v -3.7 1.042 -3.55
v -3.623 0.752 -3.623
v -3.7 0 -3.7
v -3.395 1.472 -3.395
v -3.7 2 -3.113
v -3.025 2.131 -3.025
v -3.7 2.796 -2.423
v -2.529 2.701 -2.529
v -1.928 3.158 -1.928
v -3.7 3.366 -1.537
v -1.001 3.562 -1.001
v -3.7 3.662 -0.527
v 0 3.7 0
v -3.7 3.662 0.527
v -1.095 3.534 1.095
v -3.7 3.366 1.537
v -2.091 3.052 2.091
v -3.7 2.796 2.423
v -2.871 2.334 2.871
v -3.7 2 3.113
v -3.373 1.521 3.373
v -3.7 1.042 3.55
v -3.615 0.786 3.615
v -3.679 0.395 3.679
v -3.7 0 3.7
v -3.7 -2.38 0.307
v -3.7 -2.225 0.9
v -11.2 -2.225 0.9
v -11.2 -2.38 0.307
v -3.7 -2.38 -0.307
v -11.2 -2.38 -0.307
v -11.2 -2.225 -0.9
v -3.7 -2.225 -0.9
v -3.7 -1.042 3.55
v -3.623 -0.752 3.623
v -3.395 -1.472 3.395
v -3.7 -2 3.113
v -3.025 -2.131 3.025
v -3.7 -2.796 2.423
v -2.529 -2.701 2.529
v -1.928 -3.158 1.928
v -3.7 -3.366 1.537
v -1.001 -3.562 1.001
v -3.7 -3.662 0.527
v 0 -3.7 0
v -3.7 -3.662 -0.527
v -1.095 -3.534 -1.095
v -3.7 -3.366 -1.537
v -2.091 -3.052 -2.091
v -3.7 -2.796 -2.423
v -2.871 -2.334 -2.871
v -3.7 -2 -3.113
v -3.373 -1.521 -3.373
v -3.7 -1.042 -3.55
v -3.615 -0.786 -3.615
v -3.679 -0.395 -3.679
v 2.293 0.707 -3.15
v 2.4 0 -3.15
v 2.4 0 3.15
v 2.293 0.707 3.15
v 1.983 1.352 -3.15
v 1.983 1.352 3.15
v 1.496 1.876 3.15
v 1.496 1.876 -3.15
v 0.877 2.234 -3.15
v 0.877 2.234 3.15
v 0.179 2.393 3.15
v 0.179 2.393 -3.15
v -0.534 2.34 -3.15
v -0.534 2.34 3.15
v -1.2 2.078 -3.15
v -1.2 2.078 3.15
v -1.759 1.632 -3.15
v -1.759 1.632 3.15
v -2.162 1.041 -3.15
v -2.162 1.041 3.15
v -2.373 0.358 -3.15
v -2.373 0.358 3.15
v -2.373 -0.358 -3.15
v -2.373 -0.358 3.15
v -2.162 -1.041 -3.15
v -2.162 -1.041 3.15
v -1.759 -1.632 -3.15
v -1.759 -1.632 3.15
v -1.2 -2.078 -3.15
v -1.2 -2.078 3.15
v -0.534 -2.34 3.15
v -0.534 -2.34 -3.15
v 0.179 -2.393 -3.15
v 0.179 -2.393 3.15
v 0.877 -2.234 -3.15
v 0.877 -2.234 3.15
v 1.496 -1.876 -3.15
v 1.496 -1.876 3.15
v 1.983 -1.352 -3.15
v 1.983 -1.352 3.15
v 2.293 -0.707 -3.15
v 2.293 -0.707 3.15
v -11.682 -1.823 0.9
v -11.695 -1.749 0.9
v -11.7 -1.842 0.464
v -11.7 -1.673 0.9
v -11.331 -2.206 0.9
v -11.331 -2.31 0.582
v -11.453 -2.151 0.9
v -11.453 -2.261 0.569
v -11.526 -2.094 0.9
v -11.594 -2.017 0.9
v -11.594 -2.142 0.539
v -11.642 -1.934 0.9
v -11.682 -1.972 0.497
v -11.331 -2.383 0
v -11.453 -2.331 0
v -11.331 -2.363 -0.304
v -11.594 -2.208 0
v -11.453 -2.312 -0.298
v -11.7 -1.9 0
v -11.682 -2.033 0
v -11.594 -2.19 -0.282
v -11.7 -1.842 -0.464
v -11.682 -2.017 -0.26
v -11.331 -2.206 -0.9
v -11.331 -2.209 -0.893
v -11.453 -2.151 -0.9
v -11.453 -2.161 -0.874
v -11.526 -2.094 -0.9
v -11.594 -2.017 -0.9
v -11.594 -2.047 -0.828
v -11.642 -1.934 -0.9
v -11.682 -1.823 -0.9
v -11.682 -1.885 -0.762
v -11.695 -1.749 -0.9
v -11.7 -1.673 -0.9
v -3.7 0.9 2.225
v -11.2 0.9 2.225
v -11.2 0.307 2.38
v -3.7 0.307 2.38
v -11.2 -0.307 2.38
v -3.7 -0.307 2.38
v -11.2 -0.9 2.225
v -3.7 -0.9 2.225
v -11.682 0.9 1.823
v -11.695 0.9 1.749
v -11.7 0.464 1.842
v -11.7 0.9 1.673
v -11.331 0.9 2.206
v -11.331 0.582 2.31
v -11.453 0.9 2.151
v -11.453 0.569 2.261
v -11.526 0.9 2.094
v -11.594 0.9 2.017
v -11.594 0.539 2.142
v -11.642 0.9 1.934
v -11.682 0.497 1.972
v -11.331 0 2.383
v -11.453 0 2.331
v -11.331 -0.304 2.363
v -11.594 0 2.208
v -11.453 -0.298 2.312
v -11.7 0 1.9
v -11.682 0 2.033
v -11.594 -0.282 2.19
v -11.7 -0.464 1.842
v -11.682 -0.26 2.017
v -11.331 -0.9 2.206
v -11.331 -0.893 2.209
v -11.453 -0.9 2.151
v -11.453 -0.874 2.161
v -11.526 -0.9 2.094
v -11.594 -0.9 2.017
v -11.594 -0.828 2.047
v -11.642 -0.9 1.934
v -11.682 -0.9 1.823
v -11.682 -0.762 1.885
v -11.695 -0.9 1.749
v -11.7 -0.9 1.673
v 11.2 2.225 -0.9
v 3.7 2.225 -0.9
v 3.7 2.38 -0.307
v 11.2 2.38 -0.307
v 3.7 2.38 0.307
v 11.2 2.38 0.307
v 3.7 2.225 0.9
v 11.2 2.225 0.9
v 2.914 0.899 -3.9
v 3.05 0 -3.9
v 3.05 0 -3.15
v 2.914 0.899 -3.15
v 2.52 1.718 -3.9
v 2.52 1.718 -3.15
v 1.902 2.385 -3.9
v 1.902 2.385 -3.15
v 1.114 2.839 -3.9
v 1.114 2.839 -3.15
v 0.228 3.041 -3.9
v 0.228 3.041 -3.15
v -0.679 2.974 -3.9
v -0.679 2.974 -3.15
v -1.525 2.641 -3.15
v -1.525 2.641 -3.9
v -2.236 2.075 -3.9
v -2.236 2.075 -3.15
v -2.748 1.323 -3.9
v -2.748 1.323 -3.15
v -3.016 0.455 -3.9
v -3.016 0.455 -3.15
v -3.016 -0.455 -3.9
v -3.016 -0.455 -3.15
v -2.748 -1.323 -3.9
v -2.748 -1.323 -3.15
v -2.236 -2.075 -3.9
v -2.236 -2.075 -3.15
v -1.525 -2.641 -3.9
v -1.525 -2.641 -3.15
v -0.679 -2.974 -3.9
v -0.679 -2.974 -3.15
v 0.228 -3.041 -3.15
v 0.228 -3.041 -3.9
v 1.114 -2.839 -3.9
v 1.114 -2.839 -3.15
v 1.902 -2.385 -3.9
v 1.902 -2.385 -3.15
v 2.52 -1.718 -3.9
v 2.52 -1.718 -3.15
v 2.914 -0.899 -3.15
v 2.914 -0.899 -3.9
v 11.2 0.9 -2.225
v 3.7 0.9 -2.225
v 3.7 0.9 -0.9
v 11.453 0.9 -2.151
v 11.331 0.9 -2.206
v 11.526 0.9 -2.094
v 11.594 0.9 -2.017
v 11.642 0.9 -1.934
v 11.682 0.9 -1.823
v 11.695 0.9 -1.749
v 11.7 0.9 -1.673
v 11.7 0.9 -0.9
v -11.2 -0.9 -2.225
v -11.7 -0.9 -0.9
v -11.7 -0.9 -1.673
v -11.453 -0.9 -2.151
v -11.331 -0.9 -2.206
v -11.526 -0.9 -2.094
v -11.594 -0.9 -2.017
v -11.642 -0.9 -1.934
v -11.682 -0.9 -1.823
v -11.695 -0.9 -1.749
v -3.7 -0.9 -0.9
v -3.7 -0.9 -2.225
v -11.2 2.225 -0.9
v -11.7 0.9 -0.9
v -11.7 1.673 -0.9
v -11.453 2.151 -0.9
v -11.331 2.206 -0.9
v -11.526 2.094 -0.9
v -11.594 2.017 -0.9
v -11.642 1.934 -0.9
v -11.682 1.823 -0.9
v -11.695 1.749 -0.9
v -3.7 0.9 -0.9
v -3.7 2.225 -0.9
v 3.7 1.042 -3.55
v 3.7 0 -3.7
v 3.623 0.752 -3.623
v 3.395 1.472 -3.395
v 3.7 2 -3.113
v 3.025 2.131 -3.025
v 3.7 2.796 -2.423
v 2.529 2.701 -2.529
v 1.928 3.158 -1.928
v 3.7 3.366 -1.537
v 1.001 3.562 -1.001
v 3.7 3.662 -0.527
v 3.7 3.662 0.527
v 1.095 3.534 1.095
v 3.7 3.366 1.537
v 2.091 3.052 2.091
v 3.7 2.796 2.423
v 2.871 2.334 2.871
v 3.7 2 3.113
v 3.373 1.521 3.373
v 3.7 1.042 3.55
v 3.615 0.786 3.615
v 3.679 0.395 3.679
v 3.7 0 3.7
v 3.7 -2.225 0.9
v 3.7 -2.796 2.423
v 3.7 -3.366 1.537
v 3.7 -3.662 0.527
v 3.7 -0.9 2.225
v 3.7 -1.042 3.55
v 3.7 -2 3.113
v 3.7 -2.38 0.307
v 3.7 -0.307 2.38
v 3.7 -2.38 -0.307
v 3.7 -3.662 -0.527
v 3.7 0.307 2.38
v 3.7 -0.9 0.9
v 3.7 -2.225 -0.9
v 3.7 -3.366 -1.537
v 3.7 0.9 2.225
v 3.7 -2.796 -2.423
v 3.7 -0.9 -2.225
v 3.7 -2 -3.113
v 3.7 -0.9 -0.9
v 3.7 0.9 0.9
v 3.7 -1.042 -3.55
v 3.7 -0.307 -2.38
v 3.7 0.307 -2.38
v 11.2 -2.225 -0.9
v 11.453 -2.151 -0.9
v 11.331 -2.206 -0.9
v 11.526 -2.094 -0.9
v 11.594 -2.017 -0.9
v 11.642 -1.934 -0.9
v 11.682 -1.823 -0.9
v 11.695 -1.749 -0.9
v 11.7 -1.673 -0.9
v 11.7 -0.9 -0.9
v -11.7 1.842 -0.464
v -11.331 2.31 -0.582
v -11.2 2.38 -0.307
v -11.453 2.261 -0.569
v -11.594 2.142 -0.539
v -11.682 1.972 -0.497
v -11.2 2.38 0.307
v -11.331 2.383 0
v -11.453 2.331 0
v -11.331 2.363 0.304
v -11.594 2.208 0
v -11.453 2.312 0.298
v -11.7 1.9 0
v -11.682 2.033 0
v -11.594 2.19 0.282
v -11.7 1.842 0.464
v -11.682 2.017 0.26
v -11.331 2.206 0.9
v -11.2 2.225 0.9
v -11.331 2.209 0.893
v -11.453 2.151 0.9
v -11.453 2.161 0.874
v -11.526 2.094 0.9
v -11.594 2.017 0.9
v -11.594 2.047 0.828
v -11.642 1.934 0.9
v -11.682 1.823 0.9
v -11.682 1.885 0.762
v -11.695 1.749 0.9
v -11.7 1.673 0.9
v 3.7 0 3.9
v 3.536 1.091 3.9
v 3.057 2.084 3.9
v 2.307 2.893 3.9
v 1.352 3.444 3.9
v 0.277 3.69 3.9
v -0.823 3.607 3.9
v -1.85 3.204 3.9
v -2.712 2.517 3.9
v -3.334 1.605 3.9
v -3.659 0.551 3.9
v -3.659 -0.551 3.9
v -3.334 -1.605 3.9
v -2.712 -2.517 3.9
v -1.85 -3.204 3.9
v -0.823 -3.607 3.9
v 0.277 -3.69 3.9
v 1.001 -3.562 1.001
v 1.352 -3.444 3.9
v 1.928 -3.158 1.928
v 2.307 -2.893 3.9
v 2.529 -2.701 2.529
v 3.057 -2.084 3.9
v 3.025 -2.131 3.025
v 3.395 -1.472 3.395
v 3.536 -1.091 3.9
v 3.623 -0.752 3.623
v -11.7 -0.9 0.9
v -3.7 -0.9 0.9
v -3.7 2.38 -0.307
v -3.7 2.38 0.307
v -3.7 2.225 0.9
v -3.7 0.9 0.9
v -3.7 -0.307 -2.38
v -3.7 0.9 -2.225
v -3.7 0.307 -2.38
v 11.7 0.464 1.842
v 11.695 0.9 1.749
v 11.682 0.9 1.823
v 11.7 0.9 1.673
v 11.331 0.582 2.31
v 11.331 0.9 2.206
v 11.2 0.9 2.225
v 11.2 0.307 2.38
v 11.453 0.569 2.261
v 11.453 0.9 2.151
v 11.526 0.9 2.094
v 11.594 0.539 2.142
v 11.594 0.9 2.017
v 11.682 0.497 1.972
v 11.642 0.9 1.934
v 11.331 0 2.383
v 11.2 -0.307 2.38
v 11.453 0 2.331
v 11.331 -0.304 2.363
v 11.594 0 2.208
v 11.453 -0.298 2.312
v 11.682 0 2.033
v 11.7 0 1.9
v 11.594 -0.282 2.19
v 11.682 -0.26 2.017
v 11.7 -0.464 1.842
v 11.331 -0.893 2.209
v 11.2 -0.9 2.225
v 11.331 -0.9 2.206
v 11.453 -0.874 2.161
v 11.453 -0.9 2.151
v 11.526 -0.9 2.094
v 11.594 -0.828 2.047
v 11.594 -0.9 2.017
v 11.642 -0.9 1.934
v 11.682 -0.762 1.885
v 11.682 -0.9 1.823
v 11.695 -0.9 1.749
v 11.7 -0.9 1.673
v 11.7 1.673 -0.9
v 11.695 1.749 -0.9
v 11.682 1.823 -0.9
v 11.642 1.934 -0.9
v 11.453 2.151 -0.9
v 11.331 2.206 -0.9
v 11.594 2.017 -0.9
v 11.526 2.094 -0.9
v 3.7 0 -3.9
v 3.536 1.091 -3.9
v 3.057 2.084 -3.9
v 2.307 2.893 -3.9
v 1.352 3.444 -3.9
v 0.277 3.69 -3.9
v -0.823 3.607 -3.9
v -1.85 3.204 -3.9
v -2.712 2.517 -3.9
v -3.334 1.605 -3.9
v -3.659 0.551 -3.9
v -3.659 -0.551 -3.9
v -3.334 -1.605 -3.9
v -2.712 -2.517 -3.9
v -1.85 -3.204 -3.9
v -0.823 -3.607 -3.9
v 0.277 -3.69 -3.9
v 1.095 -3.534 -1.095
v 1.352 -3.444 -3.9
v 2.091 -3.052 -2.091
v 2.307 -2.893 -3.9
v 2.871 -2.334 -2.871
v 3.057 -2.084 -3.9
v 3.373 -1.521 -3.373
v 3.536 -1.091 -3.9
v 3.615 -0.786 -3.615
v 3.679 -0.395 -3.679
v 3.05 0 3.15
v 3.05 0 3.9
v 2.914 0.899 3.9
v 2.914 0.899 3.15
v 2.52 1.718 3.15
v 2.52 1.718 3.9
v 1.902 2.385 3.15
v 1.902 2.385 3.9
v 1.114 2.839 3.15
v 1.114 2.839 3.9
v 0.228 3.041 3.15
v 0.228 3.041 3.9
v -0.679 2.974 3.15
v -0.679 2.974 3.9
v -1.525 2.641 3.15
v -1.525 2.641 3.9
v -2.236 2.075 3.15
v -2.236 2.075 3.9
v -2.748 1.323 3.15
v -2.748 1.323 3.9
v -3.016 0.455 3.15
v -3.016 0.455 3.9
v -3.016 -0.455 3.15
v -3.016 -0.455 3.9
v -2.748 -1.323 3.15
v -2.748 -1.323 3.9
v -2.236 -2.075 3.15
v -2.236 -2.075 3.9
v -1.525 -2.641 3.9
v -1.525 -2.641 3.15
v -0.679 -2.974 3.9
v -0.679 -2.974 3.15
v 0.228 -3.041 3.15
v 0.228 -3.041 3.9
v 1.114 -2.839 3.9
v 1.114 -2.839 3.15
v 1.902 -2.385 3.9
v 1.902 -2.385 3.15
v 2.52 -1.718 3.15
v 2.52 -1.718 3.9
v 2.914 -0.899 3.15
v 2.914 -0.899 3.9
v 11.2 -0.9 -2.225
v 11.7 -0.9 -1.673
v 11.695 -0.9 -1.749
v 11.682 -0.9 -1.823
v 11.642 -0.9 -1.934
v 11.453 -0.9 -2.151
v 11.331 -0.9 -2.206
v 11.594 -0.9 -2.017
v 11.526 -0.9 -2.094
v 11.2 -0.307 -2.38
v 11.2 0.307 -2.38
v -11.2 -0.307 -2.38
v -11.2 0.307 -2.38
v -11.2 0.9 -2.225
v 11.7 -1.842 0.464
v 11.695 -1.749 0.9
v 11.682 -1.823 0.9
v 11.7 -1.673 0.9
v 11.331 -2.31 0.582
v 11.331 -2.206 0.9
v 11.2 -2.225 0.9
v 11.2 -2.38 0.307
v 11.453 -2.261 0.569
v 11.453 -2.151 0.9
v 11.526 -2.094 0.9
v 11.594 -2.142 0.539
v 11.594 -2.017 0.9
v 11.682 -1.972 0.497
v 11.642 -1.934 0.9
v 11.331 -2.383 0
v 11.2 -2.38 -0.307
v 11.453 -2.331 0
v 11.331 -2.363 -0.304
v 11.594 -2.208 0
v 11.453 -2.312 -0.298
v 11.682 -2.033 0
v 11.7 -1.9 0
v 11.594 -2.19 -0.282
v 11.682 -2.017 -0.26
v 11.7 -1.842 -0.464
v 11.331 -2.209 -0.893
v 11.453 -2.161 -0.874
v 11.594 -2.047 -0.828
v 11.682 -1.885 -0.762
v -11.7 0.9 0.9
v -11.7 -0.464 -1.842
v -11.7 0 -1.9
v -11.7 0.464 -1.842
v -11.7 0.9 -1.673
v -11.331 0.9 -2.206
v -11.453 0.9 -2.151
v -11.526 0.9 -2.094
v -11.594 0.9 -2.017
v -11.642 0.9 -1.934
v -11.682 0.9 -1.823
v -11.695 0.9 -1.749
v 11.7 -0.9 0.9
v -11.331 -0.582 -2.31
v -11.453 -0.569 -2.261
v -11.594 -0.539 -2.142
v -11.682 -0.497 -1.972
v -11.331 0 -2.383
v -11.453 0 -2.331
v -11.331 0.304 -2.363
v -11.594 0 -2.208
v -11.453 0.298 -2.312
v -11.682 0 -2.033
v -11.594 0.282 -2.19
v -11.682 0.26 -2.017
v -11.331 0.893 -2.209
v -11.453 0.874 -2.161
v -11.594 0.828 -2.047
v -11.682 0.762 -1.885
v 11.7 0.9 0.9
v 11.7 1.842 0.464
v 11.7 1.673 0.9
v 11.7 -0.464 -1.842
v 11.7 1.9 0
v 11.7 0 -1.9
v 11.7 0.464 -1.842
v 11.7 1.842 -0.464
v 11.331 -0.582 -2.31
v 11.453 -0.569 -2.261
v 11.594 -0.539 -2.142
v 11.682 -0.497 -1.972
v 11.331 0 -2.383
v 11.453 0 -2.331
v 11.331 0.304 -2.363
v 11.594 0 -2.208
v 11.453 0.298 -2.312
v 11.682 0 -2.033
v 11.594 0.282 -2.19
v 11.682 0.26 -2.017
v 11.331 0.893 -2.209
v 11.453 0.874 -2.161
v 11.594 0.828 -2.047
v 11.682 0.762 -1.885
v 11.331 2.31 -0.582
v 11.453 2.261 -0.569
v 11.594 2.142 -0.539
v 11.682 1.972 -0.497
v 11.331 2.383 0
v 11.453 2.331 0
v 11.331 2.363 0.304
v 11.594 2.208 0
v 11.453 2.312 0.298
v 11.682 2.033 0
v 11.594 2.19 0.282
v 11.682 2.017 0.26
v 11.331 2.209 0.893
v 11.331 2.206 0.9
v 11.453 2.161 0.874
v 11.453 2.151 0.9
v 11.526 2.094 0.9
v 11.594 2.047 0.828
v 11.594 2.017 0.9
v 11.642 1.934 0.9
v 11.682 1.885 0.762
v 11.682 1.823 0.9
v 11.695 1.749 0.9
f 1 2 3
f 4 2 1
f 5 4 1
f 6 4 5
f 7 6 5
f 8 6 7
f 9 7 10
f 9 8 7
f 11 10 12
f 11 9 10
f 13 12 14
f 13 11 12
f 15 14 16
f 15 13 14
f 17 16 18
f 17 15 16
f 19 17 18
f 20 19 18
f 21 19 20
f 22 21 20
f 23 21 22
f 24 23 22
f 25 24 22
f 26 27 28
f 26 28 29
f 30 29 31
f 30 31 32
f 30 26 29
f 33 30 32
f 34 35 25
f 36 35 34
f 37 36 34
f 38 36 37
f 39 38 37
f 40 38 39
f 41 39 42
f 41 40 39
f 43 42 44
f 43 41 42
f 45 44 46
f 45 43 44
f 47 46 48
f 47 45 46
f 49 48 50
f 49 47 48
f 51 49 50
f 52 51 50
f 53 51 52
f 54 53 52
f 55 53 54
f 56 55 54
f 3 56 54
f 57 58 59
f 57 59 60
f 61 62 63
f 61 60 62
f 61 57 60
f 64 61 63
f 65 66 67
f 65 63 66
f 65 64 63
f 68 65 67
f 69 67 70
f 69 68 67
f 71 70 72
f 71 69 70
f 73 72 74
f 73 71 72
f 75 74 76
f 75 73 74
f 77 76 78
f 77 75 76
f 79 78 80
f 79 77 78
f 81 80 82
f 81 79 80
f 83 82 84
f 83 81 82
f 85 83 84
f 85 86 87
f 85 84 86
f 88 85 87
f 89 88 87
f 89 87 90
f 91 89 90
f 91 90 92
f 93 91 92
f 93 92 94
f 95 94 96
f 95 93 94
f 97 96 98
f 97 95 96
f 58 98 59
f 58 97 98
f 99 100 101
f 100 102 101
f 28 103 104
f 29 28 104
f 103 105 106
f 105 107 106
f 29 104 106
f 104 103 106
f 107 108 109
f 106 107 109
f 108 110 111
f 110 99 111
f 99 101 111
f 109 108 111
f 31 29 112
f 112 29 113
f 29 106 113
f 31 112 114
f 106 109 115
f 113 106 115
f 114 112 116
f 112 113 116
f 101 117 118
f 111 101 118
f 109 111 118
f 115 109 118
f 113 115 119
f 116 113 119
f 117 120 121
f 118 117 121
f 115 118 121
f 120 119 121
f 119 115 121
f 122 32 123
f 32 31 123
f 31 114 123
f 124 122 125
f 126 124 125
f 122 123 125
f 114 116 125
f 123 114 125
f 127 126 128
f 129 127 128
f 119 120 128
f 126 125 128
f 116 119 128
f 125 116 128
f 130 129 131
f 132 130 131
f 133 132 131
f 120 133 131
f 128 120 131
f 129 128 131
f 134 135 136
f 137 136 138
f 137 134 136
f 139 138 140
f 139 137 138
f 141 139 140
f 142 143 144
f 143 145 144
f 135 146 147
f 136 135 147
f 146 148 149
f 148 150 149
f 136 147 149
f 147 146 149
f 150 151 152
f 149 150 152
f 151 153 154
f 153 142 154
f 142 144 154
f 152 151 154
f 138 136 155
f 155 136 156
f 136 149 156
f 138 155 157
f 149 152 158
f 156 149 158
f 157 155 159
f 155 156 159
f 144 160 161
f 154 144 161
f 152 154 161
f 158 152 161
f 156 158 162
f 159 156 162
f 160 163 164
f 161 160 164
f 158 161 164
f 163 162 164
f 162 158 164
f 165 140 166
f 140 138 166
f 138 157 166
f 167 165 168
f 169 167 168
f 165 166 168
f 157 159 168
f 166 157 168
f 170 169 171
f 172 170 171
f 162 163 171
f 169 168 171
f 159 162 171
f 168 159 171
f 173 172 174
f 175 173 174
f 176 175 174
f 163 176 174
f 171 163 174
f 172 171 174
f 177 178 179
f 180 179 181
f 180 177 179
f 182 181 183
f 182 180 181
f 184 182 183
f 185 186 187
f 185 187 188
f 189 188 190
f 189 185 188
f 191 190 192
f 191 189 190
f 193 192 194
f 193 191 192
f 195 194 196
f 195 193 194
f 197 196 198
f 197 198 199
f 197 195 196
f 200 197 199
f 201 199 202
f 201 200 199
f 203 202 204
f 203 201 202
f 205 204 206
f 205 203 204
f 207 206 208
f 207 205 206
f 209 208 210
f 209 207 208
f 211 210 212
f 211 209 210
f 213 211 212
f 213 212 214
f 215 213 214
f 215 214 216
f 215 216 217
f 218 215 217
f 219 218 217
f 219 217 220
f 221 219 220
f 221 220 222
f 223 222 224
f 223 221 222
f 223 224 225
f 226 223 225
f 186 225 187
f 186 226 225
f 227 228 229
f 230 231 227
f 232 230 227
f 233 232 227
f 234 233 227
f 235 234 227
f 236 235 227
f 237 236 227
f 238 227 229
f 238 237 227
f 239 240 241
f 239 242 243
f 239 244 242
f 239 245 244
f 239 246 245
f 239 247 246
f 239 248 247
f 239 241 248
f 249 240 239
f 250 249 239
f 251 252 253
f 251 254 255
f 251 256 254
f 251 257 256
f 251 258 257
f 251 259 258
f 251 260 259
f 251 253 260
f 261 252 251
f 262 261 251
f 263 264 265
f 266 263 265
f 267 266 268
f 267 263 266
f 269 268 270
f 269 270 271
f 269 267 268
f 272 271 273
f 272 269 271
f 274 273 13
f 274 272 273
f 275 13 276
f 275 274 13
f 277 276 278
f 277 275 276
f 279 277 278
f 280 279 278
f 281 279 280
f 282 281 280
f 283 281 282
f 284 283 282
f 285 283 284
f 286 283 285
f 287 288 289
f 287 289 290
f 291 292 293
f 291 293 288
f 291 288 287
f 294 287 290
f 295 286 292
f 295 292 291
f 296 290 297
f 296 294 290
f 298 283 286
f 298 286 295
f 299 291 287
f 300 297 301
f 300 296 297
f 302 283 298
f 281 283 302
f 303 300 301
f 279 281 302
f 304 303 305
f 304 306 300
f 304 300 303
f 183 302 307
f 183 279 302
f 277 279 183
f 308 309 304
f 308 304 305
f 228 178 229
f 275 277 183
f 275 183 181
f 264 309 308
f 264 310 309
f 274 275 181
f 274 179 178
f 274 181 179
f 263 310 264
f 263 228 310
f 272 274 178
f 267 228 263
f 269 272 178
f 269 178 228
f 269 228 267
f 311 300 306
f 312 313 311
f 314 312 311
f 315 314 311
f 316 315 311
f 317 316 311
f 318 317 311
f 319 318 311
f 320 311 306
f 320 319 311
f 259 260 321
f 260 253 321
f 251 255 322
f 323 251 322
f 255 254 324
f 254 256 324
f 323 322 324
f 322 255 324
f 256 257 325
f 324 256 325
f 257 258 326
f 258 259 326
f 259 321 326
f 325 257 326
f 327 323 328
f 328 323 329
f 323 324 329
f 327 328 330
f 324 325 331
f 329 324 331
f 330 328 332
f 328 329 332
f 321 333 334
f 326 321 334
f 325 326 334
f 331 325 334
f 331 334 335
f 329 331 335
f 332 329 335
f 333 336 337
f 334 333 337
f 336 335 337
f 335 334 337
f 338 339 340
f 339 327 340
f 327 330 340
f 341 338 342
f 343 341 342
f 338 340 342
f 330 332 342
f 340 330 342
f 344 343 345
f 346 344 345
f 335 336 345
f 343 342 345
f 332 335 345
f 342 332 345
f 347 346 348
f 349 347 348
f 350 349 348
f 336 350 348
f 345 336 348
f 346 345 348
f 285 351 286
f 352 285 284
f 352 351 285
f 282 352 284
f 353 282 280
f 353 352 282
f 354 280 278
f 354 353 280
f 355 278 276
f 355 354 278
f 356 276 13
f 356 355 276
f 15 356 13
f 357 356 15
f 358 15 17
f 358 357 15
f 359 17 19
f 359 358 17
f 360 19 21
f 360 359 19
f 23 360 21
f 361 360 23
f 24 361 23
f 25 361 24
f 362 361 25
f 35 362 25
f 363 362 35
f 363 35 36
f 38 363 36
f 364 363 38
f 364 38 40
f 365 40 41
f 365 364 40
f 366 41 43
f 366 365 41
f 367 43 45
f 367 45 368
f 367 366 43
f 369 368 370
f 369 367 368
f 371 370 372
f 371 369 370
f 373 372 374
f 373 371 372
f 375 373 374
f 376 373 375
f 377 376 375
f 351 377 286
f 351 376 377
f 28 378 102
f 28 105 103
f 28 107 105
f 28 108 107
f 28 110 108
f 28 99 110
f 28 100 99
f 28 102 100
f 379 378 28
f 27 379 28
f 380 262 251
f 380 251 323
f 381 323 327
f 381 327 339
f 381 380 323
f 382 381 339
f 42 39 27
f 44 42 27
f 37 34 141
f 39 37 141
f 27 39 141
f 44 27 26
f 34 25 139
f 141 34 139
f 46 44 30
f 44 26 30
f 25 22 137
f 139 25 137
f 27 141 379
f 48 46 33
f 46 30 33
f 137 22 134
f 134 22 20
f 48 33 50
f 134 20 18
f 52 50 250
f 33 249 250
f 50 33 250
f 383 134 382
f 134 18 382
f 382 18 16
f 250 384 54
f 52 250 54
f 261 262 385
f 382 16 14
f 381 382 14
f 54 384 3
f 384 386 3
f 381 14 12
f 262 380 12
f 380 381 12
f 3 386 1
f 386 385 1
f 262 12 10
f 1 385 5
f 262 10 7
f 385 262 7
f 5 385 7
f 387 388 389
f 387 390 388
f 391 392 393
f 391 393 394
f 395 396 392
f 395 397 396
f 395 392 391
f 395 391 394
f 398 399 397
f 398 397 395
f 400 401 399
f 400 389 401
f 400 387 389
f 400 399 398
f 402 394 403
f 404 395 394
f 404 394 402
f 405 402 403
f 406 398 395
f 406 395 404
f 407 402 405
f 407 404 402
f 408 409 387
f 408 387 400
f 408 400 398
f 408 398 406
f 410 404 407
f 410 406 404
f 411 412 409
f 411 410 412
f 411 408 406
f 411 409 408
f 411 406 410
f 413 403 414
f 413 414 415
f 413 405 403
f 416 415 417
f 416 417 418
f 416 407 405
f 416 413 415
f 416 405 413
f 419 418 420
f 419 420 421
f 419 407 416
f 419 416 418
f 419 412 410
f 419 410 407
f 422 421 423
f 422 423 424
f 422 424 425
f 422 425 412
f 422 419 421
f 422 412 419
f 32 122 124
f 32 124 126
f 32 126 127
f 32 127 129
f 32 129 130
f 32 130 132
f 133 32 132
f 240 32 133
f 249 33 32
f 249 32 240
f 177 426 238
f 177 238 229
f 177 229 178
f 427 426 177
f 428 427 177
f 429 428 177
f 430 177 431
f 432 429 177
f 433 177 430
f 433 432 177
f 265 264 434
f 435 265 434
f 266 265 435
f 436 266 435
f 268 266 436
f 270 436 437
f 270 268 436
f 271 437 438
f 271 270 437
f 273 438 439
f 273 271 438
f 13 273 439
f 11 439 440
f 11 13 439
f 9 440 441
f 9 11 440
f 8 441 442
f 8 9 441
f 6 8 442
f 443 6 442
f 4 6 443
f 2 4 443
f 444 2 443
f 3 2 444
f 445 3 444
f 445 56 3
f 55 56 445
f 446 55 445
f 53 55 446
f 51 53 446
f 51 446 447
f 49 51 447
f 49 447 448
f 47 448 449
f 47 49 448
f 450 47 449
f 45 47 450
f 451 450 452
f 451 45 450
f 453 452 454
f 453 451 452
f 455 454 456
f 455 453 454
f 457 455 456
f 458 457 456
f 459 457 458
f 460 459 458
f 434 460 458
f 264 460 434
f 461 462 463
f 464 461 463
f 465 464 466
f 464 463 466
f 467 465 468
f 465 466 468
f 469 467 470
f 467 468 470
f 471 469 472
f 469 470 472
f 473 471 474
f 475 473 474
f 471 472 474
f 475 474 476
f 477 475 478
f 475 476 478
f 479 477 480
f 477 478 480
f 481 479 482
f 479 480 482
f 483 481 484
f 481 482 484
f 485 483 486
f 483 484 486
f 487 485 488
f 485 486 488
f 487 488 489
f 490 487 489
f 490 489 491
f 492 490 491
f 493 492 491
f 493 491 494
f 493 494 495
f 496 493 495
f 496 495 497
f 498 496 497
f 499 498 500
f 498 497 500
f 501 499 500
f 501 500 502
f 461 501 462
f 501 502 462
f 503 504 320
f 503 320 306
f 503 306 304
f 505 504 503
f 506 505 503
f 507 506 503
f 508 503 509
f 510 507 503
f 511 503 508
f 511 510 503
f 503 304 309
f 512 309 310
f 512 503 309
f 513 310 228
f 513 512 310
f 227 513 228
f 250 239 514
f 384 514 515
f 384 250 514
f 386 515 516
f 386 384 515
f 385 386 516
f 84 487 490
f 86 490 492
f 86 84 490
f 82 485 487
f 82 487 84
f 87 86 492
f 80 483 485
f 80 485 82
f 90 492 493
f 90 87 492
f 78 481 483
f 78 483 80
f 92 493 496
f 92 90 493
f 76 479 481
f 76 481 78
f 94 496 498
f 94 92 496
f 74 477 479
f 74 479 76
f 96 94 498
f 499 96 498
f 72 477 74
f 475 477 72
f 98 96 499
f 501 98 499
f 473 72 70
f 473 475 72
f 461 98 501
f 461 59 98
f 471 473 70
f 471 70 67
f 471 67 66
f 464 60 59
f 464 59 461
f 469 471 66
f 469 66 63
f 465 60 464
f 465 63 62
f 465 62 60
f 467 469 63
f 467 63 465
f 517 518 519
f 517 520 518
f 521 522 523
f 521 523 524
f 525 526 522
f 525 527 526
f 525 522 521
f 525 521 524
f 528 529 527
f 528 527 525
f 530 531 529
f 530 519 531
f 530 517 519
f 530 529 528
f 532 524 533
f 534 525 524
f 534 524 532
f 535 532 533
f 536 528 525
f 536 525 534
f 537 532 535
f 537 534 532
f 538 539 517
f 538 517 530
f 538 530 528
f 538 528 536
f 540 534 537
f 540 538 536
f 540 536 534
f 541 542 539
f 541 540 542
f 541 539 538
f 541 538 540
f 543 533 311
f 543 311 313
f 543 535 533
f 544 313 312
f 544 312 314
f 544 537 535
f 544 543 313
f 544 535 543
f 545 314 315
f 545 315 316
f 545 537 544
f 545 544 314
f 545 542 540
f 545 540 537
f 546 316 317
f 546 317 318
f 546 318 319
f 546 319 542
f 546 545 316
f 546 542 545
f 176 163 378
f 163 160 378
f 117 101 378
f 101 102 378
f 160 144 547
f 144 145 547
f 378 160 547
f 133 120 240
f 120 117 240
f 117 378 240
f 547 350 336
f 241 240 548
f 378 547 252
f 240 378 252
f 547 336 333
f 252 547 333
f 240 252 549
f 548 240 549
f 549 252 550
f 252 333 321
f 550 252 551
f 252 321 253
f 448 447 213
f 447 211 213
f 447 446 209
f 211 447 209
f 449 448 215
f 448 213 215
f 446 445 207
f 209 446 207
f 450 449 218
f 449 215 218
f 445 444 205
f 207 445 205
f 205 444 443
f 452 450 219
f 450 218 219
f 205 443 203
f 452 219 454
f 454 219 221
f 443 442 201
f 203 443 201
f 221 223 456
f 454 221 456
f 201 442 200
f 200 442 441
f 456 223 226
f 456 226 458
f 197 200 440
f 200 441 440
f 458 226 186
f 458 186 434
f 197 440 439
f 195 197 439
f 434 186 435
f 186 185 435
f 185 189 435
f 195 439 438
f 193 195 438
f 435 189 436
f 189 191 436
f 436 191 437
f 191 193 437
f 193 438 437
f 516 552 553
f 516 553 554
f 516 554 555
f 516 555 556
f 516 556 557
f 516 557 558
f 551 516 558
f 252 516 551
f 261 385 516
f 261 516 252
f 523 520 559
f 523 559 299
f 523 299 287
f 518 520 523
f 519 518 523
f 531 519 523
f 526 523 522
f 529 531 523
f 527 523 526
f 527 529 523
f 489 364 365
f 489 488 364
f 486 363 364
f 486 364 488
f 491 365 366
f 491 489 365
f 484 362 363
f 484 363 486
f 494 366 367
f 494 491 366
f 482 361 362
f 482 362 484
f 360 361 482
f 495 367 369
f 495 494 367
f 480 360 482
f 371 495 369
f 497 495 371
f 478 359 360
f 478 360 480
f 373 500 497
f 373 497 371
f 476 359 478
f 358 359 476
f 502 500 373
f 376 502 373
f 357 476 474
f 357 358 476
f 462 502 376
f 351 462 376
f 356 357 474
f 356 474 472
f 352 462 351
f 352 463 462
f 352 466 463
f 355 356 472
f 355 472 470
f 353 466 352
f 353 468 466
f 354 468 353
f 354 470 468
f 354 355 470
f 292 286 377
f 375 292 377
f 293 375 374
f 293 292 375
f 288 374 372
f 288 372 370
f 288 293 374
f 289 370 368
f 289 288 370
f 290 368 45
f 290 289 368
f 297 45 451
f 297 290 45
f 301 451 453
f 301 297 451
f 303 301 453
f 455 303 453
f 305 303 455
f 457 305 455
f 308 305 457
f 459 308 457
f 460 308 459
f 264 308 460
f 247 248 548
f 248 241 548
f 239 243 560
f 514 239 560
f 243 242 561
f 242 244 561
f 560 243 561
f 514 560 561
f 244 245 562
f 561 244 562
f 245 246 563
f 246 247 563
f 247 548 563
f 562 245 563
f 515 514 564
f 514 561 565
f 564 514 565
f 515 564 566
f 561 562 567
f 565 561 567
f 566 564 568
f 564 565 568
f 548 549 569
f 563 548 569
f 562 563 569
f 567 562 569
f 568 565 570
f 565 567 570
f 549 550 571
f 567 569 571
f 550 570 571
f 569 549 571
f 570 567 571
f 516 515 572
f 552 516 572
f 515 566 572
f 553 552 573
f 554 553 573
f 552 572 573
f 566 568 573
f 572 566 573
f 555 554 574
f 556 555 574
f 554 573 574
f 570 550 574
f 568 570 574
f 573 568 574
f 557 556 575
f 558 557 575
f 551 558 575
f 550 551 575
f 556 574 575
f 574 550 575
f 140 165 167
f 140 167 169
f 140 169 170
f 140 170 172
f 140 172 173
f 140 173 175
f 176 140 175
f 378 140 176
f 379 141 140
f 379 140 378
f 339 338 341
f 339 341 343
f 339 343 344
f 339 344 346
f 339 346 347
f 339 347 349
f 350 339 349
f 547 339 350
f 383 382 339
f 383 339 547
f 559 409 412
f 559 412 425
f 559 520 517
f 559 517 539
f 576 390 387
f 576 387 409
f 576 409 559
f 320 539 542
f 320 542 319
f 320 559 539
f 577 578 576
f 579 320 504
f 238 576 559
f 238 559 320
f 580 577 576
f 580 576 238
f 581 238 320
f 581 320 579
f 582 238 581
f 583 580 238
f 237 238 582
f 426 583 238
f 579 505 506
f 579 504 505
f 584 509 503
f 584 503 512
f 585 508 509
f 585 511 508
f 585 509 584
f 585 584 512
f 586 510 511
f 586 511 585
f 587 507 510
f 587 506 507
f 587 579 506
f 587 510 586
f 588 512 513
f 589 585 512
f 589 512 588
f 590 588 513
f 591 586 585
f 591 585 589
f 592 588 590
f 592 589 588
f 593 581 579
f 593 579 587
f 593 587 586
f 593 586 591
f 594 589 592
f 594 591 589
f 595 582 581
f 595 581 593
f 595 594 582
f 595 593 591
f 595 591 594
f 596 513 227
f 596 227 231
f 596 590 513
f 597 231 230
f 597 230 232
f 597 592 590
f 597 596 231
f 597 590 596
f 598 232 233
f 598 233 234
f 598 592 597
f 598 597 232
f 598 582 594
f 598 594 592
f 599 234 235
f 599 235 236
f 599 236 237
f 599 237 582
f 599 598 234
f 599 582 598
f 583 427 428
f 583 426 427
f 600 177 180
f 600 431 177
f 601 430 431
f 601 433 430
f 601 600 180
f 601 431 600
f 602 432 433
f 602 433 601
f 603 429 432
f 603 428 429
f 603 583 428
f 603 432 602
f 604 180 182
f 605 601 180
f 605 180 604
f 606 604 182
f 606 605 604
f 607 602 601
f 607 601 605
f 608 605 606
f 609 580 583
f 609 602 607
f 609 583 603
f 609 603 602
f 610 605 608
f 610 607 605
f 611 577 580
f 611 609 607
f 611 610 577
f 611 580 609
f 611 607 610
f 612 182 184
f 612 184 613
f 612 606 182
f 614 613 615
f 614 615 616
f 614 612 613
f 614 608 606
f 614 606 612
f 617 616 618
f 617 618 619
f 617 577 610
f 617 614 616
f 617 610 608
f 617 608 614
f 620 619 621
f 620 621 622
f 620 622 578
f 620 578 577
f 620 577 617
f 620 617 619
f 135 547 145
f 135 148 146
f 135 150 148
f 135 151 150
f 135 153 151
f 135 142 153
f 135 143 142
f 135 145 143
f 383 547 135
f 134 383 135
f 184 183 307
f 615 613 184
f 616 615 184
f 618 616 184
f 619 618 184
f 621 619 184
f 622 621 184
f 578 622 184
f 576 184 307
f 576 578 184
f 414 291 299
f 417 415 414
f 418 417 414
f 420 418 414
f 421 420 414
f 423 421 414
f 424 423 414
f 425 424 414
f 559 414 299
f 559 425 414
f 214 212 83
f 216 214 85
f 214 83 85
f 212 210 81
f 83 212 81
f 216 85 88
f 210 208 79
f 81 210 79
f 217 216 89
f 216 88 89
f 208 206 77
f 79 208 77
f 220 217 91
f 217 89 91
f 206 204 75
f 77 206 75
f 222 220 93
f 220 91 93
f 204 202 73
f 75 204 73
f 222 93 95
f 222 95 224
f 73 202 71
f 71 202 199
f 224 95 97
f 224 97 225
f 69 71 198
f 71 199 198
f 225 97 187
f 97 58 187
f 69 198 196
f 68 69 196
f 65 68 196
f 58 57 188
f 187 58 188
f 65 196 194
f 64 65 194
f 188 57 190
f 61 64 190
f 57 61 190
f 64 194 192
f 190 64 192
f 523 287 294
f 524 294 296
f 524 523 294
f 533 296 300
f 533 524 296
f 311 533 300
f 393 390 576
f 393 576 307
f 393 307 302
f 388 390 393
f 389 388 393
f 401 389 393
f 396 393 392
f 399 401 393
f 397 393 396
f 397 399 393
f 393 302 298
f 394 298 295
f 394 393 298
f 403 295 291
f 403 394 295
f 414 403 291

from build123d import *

# Parameters (mm, degrees)
SKETCH1_W              = 1.8
SKETCH1_H              = 1.8
PIN_DEPTH              = 11.7
SKETCH2_R              = 3.7
MIDDLE_DEPTH           = 3.7
SKETCH6_R              = 3.7
MIDDLE_BODY_DEPTH      = 3.9
MIDDLE_BORE_DEPTH      = 13.875946567
MIDDLE_BORE_DEPTH_BACK = 13.875946567
SKETCH7_R              = 2.4
SKETCH8_R              = 3.05
MIDDLE_RIM_CUT_DEPTH   = 0.75
FILLET1_R              = 0.5


with BuildPart() as part:
    # Sketch1 → Pin (new, symmetric)
    with BuildSketch(Plane(origin=(0, 0, 0), x_dir=(0, 0, -1), z_dir=(1, 0, 0))):
        with BuildLine():
            Line((-0.9, 0.9), (0.9, 0.9))
            Line((0.9, 0.9), (0.9, 2.224859546))
            ThreePointArc((0.9, 2.224859546), (0.45844143, 2.355808026), (0, 2.4))
            ThreePointArc((0, 2.4), (-0.45844143, 2.355808026), (-0.9, 2.224859546))
            Line((-0.9, 2.224859546), (-0.9, 0.9))
        make_face()
        Rectangle(SKETCH1_W, SKETCH1_H)
        with BuildLine():
            Line((-2.224859546, -0.9), (-0.9, -0.9))
            Line((-0.9, -0.9), (-0.9, 0.9))
            Line((-0.9, 0.9), (-2.224859546, 0.9))
            ThreePointArc((-2.224859546, 0.9), (-2.355808027, 0.458441425), (-2.4, -1e-08))
            ThreePointArc((-2.4, -1e-08), (-2.355808025, -0.458441435), (-2.224859546, -0.9))
        make_face()
        with BuildLine():
            ThreePointArc((-0.9, -2.224859546), (-0.45844143, -2.355808026), (0, -2.4))
            ThreePointArc((0, -2.4), (0.45844143, -2.355808026), (0.9, -2.224859546))
            Line((0.9, -2.224859546), (0.9, -0.9))
            Line((0.9, -0.9), (-0.9, -0.9))
            Line((-0.9, -0.9), (-0.9, -2.224859546))
        make_face()
        with BuildLine():
            Line((0.9, 0.9), (0.9, -0.9))
            Line((0.9, -0.9), (2.224859546, -0.9))
            ThreePointArc((2.224859546, -0.9), (2.355808026, -0.45844143), (2.4, 0))
            ThreePointArc((2.4, 0), (2.355808026, 0.45844143), (2.224859546, 0.9))
            Line((2.224859546, 0.9), (0.9, 0.9))
        make_face()
    extrude(amount=PIN_DEPTH, both=True)

    # Sketch2 → Middle (add, symmetric)
    with BuildSketch(Plane(origin=(0, 0, 0), x_dir=(0, 0, -1), z_dir=(1, 0, 0))):
        Circle(SKETCH2_R)
    extrude(amount=MIDDLE_DEPTH, both=True)

    # Sketch6 → Middle Body (add, symmetric)
    with BuildSketch(Plane.XY):
        Circle(SKETCH6_R)
    extrude(amount=MIDDLE_BODY_DEPTH, both=True)

    # Sketch7 → Middle Bore (cut, two sides: drawn at the far end of the back side and taken through both)
    with BuildSketch(Plane.XY.offset(-MIDDLE_BORE_DEPTH_BACK)):
        Circle(SKETCH7_R)
    extrude(amount=MIDDLE_BORE_DEPTH + MIDDLE_BORE_DEPTH_BACK, mode=Mode.SUBTRACT)

    # Sketch8 → Middle Rim Cut (cut)
    with BuildSketch(Plane.XY.offset(3.9)):
        Circle(SKETCH8_R)
    middle_rim_cut = extrude(amount=-MIDDLE_RIM_CUT_DEPTH, mode=Mode.SUBTRACT)

    # Mirror2: Middle Rim Cut across plane
    add(middle_rim_cut.mirror(Plane.XY), mode=Mode.SUBTRACT)

    # Fillet1
    fillet1_edges = [part.edges().sort_by_distance(p)[0] for p in [
        (11.7, 2.4, 0),
        (-11.7, 0, -2.4),
        (-11.7, -2.4, 0),
        (-11.7, 0, 2.4),
        (-11.7, 2.4, 0),
        (11.7, 0, 2.4),
        (11.7, -2.4, 0),
        (11.7, 0, -2.4),
    ]]
    fillet(fillet1_edges, radius=FILLET1_R)


solid = part.part
